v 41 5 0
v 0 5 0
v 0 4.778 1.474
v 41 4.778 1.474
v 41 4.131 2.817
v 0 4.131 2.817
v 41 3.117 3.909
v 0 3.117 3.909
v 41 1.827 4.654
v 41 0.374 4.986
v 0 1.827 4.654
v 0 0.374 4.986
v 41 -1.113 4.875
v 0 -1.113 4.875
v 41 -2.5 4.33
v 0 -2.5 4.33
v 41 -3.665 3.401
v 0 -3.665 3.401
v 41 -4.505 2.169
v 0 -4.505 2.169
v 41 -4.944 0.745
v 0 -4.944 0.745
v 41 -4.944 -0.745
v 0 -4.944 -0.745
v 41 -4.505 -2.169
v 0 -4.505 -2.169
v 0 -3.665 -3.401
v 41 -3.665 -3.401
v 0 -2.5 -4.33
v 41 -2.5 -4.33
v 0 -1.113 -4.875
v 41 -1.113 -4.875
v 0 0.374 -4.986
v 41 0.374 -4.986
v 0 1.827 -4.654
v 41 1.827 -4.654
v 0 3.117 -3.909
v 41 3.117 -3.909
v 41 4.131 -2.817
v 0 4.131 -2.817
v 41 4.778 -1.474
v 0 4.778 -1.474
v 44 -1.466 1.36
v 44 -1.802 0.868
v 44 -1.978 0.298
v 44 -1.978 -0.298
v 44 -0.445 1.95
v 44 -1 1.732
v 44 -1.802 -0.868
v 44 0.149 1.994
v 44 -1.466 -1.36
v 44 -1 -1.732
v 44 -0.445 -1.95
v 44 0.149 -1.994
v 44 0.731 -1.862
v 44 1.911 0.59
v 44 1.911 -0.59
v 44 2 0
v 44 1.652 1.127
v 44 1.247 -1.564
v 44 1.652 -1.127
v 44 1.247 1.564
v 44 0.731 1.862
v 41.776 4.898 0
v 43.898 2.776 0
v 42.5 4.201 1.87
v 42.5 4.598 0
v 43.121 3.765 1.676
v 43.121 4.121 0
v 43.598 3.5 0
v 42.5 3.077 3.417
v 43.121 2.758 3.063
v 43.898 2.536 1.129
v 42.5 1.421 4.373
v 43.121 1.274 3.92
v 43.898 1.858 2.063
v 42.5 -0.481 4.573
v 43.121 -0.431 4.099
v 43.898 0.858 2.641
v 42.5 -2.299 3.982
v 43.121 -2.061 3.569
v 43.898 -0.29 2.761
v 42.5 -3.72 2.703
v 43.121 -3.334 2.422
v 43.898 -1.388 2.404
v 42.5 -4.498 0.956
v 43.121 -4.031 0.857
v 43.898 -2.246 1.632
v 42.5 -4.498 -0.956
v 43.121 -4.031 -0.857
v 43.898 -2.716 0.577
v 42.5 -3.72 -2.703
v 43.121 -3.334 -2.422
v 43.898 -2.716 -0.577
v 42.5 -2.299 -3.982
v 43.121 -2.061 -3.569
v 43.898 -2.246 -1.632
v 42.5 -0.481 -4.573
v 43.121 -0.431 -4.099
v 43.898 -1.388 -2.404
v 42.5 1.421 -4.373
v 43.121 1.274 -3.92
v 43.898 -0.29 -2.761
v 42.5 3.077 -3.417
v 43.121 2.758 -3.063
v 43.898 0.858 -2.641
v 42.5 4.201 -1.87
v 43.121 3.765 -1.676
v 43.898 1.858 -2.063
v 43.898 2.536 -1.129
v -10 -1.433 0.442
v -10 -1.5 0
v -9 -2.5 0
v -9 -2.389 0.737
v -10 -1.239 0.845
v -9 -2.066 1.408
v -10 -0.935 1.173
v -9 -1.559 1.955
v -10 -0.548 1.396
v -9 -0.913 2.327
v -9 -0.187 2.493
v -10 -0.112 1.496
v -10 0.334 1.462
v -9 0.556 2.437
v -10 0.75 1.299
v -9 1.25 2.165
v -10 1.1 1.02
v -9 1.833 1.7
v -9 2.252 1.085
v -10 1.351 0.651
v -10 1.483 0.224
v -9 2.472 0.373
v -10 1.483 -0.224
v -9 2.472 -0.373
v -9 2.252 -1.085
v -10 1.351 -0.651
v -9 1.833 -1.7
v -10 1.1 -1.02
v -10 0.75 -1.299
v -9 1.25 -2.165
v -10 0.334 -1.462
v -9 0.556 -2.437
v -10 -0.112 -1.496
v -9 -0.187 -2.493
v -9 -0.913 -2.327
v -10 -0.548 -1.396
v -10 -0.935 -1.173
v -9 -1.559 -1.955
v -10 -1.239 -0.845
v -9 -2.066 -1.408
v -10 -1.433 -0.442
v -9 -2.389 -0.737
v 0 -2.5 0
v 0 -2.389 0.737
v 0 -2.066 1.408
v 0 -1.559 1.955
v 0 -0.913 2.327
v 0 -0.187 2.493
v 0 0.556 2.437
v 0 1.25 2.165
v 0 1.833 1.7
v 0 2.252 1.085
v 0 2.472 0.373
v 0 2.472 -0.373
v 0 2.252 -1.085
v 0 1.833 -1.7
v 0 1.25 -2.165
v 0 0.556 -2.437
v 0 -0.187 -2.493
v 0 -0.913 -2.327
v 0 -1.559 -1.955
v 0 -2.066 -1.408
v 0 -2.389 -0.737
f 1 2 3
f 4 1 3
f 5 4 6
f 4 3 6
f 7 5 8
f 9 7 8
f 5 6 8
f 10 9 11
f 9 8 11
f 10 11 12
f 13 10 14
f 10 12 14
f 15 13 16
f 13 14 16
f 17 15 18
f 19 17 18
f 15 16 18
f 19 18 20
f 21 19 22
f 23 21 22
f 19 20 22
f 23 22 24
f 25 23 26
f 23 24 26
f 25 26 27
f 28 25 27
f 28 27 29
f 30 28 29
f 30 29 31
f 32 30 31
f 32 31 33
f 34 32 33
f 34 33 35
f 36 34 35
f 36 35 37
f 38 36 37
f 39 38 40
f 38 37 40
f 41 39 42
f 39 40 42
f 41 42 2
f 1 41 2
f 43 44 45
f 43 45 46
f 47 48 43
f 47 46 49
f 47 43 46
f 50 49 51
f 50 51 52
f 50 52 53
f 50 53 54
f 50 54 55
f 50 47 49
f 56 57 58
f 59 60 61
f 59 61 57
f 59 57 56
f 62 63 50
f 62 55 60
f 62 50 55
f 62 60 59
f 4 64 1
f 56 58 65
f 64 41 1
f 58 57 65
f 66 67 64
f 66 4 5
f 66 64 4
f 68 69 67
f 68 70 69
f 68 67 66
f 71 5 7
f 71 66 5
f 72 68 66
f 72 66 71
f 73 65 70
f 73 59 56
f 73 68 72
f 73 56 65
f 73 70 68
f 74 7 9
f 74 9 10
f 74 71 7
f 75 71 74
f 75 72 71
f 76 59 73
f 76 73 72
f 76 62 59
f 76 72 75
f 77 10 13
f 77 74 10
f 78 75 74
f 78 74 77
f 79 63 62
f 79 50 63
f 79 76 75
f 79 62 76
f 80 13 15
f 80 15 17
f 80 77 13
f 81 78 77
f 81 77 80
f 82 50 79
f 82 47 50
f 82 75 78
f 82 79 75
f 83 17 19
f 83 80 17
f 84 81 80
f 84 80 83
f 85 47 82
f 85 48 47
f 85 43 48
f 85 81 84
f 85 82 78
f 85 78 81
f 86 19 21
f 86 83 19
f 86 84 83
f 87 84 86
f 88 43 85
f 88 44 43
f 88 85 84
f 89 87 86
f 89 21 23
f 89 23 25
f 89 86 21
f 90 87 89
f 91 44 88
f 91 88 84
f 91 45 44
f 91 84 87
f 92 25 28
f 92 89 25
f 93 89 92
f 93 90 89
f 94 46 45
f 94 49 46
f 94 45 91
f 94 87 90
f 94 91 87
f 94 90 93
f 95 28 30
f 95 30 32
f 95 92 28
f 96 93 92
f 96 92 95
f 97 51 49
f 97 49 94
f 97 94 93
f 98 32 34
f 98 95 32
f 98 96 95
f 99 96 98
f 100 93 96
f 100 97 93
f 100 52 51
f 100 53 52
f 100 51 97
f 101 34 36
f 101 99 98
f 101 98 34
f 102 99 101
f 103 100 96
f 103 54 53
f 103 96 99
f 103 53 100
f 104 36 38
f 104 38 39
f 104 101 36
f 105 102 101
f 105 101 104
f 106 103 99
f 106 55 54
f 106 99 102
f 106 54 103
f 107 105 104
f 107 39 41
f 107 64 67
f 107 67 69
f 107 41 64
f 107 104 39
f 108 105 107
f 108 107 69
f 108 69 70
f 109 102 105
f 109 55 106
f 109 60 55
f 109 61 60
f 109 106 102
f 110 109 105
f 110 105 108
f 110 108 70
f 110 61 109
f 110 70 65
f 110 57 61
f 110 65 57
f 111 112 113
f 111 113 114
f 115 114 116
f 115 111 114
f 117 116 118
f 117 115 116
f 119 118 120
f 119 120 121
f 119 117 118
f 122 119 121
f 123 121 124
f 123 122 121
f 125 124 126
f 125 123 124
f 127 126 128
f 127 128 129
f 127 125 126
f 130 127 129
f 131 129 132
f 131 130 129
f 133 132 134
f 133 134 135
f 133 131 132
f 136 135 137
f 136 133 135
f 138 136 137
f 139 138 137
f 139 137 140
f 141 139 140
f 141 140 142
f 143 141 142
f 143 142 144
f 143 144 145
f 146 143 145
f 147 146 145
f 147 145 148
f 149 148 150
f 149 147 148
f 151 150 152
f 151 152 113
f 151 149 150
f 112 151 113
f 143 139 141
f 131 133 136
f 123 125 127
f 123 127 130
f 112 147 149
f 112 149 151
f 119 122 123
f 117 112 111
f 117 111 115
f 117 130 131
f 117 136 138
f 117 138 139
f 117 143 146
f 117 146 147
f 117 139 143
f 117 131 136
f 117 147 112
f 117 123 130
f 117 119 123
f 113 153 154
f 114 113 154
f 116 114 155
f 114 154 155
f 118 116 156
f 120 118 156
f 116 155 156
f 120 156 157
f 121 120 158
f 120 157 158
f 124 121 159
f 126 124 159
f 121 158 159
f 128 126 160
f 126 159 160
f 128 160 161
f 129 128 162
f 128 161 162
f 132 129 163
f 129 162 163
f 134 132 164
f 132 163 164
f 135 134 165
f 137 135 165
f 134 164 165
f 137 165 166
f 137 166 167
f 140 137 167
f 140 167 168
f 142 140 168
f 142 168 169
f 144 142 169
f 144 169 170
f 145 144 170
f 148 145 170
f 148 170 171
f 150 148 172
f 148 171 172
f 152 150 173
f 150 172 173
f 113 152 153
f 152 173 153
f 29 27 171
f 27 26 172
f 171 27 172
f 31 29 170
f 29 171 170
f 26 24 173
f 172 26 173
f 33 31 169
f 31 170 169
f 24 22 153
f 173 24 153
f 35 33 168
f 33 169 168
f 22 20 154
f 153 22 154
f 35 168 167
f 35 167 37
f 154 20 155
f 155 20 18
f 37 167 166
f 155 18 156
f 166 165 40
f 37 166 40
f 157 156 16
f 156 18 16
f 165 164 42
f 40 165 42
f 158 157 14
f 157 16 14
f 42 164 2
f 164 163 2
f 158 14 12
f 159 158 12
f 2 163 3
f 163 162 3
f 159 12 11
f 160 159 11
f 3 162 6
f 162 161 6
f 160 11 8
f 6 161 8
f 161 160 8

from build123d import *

# Parameters (mm, degrees)
F0_R     = 5
F1_DEPTH = 44
F2_R     = 2.5
F3_DEPTH = 10
F4_SIZE  = 1
F5_R     = 3


with BuildPart() as f1:
    # F0 (on Right) → F1 (new body)
    with BuildSketch(Plane.YZ):
        Circle(F0_R)
    extrude(amount=F1_DEPTH)

    # F2 (on face) → F3 (join)
    with BuildSketch(Plane(origin=(0, 0, 0), x_dir=(0, -1, 0), z_dir=(-1, 0, 0))):
        Circle(F2_R)
    extrude(amount=F3_DEPTH)

    # F4
    f4_edges = [f1.edges().sort_by_distance(p)[0] for p in [
        (-10, 2.5, 0),
    ]]
    chamfer(f4_edges, length=F4_SIZE)

    # F5
    f5_edges = [f1.edges().sort_by_distance(p)[0] for p in [
        (44, -5, 0),
    ]]
    fillet(f5_edges, radius=F5_R)


solid = f1.part
